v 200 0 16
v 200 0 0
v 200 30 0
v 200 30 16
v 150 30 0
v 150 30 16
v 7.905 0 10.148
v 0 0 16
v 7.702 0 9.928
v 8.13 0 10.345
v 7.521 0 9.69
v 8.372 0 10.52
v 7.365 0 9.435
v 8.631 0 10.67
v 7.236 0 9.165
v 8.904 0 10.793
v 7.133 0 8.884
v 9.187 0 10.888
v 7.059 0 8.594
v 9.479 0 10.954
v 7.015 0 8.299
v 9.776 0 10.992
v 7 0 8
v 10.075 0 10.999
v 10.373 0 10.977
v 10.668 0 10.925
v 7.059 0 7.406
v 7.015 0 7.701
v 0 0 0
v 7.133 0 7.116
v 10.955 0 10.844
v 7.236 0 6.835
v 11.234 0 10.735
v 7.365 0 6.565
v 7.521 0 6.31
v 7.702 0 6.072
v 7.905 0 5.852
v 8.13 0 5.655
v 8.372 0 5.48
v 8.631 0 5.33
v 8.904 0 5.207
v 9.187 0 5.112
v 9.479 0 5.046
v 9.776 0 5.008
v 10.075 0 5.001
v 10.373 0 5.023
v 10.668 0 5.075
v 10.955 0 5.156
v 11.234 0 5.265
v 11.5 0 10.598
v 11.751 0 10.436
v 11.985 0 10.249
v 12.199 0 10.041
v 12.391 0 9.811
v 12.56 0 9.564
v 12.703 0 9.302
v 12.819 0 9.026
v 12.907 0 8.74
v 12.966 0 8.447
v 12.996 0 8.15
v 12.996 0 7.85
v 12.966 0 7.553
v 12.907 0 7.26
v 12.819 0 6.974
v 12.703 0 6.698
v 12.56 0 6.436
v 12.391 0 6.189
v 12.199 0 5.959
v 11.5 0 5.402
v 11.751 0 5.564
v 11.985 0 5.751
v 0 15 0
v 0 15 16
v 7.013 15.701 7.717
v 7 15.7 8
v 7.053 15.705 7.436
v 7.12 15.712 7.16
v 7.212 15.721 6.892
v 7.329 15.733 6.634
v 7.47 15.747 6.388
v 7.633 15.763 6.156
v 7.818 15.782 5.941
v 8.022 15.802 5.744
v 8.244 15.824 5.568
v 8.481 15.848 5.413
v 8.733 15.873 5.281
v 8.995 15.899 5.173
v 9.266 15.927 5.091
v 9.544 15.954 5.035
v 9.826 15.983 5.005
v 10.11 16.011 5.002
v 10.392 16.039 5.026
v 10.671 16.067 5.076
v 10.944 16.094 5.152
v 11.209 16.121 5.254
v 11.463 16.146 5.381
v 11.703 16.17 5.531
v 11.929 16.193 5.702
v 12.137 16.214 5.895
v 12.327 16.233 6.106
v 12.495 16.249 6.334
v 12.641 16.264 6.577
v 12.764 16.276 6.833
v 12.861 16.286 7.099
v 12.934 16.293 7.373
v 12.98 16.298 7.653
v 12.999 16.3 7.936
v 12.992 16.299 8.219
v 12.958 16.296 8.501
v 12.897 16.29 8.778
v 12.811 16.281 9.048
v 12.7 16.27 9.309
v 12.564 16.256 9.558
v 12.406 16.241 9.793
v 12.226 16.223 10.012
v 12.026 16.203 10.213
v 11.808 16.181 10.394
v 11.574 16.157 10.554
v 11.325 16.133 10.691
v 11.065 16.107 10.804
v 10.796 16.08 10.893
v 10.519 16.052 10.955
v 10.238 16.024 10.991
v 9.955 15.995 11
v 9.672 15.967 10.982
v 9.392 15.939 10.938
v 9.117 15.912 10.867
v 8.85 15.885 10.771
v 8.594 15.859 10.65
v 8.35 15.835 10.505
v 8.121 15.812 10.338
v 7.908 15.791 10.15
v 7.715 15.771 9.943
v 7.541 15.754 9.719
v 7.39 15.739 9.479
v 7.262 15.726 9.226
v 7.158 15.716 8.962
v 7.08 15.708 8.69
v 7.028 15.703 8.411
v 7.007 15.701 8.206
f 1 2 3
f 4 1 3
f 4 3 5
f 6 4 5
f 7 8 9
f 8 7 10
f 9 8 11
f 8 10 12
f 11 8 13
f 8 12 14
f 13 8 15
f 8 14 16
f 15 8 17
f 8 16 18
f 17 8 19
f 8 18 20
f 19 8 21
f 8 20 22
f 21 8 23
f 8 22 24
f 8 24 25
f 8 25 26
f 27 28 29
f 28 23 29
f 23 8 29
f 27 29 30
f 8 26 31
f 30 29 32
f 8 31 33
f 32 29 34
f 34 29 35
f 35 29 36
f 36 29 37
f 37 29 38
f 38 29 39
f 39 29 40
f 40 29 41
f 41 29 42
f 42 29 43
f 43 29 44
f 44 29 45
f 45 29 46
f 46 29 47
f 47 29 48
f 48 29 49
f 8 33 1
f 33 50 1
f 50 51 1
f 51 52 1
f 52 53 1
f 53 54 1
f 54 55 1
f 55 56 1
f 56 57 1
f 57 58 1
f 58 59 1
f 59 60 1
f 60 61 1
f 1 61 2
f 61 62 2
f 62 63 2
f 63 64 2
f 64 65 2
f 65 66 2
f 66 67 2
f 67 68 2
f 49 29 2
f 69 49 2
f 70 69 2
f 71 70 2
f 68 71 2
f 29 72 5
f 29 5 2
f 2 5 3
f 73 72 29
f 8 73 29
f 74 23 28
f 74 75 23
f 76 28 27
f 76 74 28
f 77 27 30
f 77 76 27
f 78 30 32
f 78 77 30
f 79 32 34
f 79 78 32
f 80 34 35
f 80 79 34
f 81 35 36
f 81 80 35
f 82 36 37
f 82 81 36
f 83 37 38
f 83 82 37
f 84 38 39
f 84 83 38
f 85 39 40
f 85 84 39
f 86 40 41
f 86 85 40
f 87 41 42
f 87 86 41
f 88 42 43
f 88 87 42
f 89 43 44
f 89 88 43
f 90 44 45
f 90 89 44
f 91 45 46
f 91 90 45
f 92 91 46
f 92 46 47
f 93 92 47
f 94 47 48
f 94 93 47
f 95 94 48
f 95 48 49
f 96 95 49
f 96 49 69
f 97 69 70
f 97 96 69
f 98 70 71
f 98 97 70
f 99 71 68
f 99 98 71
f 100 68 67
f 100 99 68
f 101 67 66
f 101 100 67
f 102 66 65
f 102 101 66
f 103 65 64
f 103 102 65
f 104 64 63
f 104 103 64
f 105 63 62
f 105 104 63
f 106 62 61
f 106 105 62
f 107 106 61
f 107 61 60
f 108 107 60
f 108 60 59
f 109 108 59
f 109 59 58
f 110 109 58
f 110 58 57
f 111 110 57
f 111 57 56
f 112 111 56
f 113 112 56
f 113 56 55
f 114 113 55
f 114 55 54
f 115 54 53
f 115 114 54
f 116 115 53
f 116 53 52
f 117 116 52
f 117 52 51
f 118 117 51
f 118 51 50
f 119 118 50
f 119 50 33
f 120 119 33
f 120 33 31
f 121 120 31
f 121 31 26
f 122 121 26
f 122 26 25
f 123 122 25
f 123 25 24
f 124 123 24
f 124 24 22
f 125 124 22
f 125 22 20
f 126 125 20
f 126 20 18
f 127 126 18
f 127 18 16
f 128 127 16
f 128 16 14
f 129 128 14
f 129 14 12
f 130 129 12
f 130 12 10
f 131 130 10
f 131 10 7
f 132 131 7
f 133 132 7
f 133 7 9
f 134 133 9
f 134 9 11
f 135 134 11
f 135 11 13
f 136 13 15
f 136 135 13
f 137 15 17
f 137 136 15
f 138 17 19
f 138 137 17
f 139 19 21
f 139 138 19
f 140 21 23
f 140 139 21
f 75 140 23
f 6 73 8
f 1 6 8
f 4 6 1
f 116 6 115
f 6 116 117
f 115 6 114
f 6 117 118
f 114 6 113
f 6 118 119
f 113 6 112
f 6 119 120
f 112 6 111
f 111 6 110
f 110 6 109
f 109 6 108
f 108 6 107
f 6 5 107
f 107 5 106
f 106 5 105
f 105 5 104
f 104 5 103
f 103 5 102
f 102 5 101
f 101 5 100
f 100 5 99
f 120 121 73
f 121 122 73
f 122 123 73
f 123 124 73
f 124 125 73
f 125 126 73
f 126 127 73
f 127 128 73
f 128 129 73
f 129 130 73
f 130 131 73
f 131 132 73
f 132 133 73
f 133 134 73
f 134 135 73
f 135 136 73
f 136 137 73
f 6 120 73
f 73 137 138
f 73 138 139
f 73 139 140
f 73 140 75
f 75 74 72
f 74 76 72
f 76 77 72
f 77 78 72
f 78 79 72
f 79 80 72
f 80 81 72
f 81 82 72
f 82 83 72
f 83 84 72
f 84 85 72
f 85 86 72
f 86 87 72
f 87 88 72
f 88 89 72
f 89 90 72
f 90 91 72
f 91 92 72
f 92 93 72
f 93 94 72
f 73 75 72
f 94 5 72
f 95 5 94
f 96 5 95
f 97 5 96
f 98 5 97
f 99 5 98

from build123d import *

# Parameters (mm, degrees)
BOSS_EXTRU_1_DEPTH           = 16
ENL_V_MAT_EXTRU_1_DEPTH      = 203.869416128
ENL_V_MAT_EXTRU_1_DEPTH_BACK = 203.869416128
ESQUISSE2_R                  = 3


with BuildPart() as part:
    # Esquisse1 → Boss.-Extru.1 (new body)
    with BuildSketch(Plane.XY):
        Polygon((0, 0), (200, 0), (200, 30), (150, 30), (0, 15), align=None)
    extrude(amount=BOSS_EXTRU_1_DEPTH)

    # Esquisse2 → Enlèv. mat.-Extru.1 (cut, two sides: drawn at the far end of the back side and taken through both)
    with BuildSketch(Plane.XZ.offset(-ENL_V_MAT_EXTRU_1_DEPTH_BACK)):
        with Locations(Location((10, 8, 0), (0, 0, 180))):
            Circle(ESQUISSE2_R)
    extrude(amount=ENL_V_MAT_EXTRU_1_DEPTH + ENL_V_MAT_EXTRU_1_DEPTH_BACK, mode=Mode.SUBTRACT)


solid = part.part
